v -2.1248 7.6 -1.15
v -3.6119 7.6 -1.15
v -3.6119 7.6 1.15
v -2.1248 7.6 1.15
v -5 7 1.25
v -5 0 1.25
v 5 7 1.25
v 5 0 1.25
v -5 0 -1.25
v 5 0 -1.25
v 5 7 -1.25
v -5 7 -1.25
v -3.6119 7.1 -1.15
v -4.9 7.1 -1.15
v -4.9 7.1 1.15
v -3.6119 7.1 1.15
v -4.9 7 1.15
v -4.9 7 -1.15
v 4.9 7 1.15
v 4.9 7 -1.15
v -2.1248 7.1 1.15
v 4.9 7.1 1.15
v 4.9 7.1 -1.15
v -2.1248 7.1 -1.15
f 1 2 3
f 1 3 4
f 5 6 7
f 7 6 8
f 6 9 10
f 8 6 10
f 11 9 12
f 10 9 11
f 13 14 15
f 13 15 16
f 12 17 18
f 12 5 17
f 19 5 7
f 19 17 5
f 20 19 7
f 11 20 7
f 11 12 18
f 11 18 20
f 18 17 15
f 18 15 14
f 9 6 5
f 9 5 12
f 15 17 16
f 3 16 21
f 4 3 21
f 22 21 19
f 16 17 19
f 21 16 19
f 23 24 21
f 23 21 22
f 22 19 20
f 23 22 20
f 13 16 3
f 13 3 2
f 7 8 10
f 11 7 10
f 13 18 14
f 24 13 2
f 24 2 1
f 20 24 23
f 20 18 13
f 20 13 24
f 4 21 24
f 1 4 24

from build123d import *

# Parameters (mm, degrees)
SKETCH1_W           = 10
SKETCH1_H           = 2.5
BOSS_EXTRUDE1_DEPTH = 7
SKETCH2_W           = 9.8
SKETCH2_H           = 2.3
BOSS_EXTRUDE2_DEPTH = 0.1
SKETCH3_W           = 1.487009638
SKETCH3_H           = 2.3
BOSS_EXTRUDE3_DEPTH = 0.5


with BuildPart() as part:
    # Sketch1 → Boss-Extrude1 (new body)
    with BuildSketch(Plane(origin=(0, 0, 0), x_dir=(1, 0, 0), z_dir=(0, 1, 0))):
        Rectangle(SKETCH1_W, SKETCH1_H)
    extrude(amount=BOSS_EXTRUDE1_DEPTH)

    # Sketch2 → Boss-Extrude2 (add)
    with BuildSketch(Plane(origin=(0, 7, 0), x_dir=(1, 0, 0), z_dir=(0, 1, 0))):
        Rectangle(SKETCH2_W, SKETCH2_H)
    extrude(amount=BOSS_EXTRUDE2_DEPTH)

    # Sketch3 → Boss-Extrude3 (add)
    with BuildSketch(Plane(origin=(0, 7.1, 0), x_dir=(1, 0, 0), z_dir=(0, 1, 0))):
        with Locations((-2.868353266, 0)):
            Rectangle(SKETCH3_W, SKETCH3_H)
    extrude(amount=BOSS_EXTRUDE3_DEPTH)


solid = part.part
